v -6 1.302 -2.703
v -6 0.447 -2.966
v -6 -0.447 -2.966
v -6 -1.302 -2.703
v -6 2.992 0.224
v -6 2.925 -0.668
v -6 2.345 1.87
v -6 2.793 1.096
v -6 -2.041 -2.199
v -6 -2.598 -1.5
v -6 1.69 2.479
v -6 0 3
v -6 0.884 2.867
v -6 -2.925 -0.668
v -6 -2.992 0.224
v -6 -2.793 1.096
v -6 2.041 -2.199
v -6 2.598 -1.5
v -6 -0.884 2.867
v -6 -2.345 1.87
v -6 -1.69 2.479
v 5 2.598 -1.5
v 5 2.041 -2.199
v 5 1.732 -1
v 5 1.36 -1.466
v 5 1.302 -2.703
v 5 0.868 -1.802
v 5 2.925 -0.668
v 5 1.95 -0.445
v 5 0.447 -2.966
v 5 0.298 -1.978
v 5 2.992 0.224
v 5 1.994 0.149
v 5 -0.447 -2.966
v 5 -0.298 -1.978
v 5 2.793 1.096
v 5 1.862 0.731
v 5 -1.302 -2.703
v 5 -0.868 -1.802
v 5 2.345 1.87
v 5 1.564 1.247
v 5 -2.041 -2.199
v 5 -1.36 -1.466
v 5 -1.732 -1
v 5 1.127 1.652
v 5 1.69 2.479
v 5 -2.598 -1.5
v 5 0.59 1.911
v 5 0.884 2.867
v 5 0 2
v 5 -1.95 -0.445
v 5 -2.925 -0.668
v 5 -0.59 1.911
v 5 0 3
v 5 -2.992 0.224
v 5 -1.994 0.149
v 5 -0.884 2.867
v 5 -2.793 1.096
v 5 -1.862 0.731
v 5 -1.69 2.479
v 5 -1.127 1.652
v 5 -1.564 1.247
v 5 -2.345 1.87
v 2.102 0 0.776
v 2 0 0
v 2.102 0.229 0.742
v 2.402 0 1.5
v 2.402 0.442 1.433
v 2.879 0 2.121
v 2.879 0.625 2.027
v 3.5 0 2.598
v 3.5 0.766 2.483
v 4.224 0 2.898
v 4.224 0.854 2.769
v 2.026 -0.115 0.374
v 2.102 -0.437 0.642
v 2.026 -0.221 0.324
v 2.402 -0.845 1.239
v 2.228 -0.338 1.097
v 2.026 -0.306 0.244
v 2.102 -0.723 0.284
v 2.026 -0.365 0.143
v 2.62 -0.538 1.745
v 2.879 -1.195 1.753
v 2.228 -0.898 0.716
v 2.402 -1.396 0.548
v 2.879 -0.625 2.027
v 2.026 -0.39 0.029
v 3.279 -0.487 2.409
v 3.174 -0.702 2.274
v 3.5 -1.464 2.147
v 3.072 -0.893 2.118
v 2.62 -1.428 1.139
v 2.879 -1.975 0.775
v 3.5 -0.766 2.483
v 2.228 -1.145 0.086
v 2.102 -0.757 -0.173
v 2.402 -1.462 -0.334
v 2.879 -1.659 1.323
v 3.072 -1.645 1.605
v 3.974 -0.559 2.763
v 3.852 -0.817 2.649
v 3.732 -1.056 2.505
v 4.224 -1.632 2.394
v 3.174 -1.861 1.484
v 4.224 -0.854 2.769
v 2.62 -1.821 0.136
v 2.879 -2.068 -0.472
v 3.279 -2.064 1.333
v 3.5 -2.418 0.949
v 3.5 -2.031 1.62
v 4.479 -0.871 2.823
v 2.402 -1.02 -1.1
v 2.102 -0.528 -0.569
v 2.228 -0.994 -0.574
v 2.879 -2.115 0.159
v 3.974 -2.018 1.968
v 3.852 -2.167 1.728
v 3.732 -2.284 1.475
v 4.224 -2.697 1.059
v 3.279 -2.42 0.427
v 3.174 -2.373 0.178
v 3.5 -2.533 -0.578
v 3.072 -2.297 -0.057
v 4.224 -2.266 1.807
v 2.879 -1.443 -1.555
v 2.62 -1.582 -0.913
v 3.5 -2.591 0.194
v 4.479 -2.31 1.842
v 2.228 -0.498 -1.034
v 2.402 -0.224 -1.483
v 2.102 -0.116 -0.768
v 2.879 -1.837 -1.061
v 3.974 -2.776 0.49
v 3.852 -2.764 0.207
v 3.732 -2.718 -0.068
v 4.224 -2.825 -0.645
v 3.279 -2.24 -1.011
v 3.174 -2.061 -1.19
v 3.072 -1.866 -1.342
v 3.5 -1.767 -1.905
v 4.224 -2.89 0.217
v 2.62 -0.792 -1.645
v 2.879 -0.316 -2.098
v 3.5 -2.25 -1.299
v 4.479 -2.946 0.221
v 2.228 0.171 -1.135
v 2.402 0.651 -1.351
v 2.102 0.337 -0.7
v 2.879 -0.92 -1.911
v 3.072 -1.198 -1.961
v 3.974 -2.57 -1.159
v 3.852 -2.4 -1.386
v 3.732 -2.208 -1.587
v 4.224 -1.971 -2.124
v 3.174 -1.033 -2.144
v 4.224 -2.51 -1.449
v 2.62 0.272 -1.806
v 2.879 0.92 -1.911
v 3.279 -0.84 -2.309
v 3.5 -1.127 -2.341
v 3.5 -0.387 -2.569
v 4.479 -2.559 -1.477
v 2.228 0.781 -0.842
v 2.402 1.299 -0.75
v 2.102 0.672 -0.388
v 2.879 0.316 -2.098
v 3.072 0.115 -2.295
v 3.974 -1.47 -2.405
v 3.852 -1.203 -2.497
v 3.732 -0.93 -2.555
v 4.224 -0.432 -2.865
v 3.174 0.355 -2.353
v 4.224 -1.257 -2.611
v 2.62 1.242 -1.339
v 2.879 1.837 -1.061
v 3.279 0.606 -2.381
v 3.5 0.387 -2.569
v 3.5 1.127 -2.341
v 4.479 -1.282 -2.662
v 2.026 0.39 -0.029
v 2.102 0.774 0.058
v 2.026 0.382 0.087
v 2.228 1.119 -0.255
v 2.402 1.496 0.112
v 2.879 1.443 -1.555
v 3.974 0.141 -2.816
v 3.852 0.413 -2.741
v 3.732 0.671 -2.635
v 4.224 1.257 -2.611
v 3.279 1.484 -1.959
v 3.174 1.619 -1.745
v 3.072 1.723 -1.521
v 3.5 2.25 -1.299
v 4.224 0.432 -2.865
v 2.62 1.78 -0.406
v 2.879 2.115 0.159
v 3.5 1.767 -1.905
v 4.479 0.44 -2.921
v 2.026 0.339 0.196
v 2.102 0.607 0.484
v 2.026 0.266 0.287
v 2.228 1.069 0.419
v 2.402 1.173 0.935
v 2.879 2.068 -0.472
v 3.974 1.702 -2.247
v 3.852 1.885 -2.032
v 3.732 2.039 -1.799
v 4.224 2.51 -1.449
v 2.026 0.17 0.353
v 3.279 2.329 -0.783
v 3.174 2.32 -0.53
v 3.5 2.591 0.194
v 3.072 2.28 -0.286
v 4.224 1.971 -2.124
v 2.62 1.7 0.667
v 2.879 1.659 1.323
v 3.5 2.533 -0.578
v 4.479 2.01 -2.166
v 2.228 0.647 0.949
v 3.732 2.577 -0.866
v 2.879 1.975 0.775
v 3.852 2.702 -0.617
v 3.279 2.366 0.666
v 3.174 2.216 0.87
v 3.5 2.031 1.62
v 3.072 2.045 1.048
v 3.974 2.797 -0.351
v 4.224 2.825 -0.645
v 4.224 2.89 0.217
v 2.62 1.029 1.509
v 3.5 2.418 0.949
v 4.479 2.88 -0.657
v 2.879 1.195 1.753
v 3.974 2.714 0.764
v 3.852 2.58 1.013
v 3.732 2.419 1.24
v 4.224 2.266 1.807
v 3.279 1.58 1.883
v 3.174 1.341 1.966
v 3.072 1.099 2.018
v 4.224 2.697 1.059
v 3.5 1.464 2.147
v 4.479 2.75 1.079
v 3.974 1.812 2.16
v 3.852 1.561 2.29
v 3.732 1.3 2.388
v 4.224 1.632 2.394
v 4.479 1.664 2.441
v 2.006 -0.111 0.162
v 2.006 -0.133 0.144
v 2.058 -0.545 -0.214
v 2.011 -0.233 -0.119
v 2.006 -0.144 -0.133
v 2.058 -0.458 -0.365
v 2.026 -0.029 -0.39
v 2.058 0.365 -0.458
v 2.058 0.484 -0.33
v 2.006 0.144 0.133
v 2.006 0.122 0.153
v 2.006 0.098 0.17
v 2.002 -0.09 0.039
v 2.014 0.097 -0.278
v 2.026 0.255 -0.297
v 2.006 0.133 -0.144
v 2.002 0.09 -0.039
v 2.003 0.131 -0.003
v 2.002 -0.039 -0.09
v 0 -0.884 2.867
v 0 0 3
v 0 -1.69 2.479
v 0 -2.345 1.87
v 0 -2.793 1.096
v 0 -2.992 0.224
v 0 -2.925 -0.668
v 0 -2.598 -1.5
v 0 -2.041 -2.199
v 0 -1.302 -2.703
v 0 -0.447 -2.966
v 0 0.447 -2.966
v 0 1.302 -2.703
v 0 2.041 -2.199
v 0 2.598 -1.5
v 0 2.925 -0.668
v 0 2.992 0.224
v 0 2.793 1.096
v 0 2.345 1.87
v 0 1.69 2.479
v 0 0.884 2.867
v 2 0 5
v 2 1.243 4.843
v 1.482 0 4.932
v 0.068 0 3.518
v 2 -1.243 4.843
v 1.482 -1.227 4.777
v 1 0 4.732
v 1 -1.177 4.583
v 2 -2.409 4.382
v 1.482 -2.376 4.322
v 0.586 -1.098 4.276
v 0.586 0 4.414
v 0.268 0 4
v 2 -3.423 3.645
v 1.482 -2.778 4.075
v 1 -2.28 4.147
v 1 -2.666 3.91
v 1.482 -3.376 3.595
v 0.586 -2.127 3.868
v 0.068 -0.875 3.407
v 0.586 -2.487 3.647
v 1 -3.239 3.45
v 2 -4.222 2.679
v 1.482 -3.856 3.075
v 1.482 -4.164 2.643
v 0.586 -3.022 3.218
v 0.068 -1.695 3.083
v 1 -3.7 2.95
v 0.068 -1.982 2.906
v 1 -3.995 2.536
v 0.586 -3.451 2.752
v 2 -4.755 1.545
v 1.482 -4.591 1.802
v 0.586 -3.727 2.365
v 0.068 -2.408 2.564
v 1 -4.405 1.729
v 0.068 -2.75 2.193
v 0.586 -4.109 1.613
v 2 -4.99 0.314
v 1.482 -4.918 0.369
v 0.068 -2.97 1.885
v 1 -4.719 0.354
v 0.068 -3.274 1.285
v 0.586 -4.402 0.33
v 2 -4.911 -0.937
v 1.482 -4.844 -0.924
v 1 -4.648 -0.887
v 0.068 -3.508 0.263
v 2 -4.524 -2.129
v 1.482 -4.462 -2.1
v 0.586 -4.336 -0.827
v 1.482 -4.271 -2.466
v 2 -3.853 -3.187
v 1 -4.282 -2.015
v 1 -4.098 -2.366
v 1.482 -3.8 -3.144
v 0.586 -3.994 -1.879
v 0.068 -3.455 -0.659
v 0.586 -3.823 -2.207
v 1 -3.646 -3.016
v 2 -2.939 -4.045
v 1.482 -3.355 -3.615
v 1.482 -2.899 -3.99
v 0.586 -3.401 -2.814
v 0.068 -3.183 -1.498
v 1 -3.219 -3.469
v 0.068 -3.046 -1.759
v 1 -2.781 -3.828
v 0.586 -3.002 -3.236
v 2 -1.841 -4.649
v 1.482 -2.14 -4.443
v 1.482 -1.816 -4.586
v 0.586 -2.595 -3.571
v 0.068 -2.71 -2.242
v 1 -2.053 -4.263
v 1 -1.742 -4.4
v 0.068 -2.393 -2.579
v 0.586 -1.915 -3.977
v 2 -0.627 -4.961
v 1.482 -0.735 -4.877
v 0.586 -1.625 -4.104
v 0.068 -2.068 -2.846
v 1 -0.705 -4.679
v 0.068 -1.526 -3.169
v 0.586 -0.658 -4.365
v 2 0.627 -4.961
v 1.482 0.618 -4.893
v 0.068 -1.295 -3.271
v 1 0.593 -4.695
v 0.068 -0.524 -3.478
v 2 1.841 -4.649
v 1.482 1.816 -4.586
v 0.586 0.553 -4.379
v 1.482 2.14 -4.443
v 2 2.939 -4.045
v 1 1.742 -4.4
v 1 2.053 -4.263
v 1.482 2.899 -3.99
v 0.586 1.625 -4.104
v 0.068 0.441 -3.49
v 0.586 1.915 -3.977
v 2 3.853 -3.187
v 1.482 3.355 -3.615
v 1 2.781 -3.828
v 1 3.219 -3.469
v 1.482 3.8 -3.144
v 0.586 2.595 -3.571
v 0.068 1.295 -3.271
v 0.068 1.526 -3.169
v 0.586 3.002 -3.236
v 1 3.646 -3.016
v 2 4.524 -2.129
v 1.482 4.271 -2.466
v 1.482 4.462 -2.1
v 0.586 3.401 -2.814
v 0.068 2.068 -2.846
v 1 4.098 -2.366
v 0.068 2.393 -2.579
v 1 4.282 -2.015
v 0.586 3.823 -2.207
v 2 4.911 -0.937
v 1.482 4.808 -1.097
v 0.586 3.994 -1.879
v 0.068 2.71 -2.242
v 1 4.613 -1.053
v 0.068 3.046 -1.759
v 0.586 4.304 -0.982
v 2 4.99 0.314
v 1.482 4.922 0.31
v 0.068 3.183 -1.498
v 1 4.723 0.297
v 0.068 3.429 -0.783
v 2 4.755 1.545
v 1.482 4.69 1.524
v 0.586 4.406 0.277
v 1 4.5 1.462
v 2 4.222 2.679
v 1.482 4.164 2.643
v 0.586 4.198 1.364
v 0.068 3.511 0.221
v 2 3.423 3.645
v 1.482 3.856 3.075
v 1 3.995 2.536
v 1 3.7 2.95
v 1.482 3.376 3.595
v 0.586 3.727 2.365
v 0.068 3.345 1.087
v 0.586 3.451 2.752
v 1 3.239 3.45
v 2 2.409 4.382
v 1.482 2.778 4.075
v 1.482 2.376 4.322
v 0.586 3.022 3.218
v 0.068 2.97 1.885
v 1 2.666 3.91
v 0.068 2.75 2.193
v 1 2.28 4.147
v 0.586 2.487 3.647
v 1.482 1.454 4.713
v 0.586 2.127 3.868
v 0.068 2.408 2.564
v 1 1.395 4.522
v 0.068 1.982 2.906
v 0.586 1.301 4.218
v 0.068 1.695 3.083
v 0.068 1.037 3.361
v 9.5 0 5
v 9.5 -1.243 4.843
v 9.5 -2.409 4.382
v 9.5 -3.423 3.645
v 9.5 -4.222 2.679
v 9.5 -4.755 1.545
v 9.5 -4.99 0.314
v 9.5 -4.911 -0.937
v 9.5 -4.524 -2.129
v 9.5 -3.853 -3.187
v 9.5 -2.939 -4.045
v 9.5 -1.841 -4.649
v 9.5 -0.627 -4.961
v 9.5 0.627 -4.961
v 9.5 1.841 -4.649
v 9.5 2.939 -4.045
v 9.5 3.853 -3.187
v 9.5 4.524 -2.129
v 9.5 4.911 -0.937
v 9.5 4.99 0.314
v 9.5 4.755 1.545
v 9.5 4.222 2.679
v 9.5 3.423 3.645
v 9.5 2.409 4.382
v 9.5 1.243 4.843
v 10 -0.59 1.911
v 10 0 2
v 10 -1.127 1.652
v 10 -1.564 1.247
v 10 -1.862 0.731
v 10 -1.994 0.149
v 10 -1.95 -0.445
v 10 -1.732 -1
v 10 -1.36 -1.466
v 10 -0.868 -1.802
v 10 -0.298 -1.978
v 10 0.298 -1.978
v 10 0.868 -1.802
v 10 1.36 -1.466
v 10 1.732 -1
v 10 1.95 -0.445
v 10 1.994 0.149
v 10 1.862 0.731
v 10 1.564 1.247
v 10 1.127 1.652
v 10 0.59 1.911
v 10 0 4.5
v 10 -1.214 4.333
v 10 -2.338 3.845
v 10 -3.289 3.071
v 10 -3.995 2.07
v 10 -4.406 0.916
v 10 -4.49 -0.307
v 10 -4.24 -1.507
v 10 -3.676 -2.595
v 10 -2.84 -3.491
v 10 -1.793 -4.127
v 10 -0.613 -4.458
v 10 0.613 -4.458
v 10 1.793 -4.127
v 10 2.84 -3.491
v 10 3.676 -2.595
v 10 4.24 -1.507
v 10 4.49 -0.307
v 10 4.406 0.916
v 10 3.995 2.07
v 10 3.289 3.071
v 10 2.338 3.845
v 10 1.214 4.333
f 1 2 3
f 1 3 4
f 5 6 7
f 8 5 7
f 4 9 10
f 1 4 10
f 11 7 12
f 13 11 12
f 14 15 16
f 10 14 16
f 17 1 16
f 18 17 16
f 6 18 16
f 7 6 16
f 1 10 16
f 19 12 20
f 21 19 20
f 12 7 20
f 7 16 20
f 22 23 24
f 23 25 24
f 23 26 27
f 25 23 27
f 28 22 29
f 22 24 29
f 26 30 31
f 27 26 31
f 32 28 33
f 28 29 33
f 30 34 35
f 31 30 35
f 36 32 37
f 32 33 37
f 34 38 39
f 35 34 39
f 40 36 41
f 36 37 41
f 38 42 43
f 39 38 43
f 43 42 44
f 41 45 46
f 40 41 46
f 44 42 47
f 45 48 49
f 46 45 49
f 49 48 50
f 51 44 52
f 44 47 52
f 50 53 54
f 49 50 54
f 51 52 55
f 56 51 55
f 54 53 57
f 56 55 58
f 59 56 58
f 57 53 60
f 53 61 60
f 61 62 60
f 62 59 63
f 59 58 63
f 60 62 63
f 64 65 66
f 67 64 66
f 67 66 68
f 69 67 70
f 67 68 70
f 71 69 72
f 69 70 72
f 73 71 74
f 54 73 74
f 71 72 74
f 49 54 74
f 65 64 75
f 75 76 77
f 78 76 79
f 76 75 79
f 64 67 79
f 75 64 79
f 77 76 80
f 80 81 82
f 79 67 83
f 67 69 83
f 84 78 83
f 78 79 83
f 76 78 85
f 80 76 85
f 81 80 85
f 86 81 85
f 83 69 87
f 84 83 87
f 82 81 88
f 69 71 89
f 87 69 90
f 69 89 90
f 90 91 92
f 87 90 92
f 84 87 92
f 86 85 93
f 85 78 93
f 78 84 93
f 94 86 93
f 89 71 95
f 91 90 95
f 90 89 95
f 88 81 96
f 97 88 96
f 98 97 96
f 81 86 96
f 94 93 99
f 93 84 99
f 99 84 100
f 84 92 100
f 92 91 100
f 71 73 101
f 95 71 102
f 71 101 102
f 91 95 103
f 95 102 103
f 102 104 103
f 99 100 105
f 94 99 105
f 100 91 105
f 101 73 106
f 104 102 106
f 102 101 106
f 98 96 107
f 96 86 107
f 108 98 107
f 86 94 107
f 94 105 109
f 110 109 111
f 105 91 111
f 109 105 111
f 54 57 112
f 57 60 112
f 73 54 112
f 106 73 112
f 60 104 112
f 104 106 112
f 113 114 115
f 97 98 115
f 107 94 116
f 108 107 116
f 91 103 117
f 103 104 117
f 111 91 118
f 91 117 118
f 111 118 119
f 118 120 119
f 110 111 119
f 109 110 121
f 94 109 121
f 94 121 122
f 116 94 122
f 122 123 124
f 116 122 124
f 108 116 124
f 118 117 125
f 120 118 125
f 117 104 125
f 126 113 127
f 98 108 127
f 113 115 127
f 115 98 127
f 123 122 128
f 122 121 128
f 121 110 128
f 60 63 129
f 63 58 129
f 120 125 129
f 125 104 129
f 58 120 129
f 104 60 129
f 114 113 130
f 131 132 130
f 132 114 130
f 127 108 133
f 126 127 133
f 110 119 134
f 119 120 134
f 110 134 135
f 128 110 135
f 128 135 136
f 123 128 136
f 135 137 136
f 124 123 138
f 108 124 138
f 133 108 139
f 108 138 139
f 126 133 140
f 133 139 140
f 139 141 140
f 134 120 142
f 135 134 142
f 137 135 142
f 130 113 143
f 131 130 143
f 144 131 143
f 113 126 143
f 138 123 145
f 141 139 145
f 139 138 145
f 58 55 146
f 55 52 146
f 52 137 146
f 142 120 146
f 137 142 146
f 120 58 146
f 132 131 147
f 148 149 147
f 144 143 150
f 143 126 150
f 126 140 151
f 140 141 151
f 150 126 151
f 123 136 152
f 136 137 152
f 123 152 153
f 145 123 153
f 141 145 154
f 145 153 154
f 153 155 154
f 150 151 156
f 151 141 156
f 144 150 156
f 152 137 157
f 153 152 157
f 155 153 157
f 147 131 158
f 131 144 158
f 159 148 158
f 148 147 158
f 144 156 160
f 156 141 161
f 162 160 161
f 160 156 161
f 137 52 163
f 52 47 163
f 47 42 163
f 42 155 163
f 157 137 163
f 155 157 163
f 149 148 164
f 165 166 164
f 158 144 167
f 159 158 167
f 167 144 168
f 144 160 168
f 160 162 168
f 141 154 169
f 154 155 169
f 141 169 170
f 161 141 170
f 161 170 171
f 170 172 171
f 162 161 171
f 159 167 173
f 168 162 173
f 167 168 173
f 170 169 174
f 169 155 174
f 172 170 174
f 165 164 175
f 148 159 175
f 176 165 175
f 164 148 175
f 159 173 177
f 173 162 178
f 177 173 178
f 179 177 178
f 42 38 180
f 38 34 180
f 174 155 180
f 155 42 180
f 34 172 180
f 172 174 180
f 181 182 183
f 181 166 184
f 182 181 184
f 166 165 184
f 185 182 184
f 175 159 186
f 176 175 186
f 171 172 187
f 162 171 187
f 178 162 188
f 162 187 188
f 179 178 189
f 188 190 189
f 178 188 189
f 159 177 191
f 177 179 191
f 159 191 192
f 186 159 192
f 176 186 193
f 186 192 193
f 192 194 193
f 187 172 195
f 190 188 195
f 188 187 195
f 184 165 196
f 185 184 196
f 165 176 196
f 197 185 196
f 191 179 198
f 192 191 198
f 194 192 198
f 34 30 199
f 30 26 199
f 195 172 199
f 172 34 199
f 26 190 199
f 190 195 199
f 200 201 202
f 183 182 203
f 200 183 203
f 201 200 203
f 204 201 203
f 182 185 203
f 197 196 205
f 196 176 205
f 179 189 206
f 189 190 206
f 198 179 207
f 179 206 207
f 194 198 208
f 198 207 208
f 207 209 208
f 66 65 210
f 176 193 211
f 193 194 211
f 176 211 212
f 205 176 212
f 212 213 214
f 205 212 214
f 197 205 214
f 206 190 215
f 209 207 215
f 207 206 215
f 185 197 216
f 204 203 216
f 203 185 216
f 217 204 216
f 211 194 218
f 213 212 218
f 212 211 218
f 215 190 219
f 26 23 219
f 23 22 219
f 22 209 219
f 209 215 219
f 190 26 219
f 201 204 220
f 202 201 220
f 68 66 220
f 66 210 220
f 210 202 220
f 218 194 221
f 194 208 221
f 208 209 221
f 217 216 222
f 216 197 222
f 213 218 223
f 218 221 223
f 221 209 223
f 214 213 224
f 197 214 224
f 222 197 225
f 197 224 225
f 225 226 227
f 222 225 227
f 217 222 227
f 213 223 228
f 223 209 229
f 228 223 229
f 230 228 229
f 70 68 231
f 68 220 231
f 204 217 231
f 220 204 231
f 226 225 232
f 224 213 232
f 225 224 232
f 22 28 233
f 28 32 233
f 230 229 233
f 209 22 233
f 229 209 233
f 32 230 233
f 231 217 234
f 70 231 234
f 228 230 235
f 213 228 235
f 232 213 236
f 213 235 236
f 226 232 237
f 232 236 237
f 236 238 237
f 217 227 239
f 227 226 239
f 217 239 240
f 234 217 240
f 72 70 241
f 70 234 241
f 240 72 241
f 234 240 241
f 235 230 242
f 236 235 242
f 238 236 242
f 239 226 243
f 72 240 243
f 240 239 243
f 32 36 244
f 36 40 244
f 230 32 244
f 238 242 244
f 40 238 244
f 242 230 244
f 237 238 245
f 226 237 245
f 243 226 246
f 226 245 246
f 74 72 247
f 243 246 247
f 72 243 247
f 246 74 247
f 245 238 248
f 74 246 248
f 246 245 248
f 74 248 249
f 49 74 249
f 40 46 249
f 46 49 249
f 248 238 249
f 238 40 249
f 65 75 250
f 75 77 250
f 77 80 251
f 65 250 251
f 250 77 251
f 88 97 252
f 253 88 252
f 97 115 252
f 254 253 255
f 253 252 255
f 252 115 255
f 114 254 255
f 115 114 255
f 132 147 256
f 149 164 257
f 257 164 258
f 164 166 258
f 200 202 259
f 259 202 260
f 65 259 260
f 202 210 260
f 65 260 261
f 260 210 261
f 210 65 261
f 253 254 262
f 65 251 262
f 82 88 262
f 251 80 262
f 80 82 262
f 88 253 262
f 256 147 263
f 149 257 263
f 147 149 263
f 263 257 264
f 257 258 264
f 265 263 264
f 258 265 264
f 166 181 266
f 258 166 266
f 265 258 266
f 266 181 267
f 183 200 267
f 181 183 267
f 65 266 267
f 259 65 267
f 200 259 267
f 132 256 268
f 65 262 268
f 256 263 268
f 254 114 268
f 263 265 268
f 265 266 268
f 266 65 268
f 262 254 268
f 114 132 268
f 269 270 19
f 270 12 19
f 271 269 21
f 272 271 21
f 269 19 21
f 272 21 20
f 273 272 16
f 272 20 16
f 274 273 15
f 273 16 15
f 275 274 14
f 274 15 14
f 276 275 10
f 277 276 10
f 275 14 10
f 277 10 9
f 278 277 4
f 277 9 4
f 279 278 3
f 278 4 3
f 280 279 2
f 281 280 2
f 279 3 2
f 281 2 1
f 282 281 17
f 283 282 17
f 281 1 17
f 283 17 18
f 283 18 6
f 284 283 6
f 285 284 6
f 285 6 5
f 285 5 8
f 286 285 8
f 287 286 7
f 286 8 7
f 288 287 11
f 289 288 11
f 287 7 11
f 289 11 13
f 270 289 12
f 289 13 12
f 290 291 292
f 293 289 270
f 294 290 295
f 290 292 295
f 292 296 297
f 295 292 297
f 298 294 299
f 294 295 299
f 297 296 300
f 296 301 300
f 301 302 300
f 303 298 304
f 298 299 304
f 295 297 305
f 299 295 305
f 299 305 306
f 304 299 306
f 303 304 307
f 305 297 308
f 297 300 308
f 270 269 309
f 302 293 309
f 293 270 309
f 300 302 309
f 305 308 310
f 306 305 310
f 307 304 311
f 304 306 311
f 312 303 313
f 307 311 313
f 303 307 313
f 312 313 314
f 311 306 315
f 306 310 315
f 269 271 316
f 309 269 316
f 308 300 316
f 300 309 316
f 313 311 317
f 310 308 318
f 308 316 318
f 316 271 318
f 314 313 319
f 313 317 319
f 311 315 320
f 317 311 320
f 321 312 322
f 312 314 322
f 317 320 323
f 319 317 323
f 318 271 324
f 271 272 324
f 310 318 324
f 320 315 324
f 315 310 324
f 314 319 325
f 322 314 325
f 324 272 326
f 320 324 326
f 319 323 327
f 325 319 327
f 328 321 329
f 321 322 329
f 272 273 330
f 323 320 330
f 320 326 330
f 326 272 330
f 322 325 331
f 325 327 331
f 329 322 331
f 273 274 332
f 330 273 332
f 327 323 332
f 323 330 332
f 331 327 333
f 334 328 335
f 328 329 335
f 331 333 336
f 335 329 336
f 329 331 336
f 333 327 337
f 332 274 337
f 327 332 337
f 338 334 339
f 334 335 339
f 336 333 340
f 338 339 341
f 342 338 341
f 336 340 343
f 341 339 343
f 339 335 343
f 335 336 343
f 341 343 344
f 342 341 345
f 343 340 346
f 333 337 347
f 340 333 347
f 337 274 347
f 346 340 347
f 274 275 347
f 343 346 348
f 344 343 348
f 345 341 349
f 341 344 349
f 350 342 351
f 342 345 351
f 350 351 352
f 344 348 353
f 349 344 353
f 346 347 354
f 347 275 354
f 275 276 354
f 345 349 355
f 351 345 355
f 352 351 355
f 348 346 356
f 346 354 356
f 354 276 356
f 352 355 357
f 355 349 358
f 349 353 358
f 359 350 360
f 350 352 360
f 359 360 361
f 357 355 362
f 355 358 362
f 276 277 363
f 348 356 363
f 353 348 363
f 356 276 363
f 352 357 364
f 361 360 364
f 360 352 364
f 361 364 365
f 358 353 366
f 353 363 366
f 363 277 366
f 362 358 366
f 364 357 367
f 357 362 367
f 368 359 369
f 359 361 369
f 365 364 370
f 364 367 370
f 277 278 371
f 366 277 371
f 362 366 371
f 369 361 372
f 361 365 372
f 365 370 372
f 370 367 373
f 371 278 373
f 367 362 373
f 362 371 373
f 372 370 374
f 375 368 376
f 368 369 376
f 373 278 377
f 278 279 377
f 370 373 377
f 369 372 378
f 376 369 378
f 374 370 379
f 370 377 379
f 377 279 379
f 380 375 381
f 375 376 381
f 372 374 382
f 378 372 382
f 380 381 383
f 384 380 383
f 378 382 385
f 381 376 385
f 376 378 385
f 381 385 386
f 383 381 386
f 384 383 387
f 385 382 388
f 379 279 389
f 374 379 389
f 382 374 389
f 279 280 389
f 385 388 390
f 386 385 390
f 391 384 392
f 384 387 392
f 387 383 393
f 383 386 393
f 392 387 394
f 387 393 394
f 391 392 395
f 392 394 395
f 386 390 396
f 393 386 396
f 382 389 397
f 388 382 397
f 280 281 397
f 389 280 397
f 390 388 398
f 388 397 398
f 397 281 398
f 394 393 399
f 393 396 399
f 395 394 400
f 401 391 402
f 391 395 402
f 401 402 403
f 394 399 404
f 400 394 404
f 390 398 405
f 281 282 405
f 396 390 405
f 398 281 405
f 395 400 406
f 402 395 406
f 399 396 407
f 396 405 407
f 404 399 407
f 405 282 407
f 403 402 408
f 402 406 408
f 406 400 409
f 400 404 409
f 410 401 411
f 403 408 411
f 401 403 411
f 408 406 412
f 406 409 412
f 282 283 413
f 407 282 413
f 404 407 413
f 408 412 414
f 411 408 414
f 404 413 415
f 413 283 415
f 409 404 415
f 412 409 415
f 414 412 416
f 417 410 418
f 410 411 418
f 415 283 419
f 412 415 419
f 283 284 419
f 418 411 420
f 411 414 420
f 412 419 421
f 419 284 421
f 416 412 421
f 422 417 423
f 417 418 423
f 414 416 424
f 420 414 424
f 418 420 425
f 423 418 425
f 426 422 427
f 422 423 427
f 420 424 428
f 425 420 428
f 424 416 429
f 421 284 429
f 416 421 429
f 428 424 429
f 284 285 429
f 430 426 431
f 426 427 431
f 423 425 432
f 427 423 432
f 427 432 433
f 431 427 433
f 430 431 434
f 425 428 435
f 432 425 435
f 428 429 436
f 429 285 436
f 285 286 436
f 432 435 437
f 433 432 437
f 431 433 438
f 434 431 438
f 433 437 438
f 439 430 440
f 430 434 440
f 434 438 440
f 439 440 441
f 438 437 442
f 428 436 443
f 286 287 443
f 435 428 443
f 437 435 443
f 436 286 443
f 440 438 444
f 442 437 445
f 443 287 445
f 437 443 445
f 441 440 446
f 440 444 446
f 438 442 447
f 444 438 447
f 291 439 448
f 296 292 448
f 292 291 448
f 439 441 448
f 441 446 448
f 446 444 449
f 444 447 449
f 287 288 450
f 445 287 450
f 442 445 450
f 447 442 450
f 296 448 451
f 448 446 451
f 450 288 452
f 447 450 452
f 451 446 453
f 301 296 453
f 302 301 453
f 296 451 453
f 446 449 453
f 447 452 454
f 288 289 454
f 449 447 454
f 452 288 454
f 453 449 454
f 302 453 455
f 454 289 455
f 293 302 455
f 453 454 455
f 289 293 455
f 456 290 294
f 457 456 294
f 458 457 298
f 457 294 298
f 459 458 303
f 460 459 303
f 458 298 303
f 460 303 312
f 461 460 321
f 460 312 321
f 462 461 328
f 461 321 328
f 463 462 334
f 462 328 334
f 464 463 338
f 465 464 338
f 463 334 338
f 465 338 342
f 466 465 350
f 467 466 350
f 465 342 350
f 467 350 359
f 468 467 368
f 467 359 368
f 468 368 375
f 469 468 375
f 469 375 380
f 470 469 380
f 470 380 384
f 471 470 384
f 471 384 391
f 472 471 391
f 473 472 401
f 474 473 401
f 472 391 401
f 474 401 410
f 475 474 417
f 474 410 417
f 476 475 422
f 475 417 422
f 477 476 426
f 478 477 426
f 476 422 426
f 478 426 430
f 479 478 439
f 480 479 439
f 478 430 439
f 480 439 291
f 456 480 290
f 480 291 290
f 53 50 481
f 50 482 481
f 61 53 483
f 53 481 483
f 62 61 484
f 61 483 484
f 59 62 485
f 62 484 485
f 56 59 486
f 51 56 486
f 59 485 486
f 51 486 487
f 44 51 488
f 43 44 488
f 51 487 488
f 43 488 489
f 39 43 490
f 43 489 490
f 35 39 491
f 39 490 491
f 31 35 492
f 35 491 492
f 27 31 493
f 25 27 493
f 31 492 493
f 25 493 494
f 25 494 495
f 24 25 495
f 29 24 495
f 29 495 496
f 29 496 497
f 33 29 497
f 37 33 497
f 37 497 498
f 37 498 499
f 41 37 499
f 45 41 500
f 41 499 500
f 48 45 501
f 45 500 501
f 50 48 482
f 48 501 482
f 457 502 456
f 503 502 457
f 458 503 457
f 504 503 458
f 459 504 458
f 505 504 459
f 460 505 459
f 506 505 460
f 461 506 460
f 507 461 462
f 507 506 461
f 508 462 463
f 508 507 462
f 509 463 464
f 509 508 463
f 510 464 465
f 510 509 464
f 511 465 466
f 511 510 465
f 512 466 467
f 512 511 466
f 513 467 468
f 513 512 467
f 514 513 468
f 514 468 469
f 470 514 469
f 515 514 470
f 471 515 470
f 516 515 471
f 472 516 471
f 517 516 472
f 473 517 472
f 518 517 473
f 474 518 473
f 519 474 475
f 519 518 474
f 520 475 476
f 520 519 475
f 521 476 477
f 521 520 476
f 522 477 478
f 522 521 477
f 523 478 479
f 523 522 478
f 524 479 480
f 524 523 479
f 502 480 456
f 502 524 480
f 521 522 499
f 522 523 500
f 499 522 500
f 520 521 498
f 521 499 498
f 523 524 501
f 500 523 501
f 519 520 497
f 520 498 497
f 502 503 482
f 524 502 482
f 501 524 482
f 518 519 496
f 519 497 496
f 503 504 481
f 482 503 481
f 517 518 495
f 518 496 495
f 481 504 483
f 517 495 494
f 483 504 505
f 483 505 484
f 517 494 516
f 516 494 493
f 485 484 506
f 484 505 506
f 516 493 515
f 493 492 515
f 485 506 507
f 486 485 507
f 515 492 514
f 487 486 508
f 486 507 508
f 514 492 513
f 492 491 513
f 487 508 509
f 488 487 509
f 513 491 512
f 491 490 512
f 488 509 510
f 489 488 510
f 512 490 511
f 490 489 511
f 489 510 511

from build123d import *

# Parameters (mm, degrees)
F2_SIZE = 0.5


with BuildPart() as f1:
    # F0 (on Front) → F1 (revolve)
    with BuildSketch(Plane.XZ):
        with BuildLine():
            Line((10, 5), (2, 5))
            ThreePointArc((2, 5), (0.585786, 4.414214), (0, 3))
            Line((0, 3), (-6, 3))
            Line((-6, 3), (-6, 0))
            Line((-6, 0), (0, 0))
            Line((0, 0), (2, 0))
            ThreePointArc((2, 0), (2.87868, 2.12132), (5, 3))
            Line((5, 3), (5, 2))
            Line((5, 2), (10, 2))
            Line((10, 2), (10, 5))
        make_face()
    revolve(axis=Axis((6.397376, 0, 0), (1, 0, 0)))

    # F2
    f2_edges = [f1.edges().sort_by_distance(p)[0] for p in [
        (10, 0, -5),
    ]]
    chamfer(f2_edges, length=F2_SIZE)


solid = f1.part
